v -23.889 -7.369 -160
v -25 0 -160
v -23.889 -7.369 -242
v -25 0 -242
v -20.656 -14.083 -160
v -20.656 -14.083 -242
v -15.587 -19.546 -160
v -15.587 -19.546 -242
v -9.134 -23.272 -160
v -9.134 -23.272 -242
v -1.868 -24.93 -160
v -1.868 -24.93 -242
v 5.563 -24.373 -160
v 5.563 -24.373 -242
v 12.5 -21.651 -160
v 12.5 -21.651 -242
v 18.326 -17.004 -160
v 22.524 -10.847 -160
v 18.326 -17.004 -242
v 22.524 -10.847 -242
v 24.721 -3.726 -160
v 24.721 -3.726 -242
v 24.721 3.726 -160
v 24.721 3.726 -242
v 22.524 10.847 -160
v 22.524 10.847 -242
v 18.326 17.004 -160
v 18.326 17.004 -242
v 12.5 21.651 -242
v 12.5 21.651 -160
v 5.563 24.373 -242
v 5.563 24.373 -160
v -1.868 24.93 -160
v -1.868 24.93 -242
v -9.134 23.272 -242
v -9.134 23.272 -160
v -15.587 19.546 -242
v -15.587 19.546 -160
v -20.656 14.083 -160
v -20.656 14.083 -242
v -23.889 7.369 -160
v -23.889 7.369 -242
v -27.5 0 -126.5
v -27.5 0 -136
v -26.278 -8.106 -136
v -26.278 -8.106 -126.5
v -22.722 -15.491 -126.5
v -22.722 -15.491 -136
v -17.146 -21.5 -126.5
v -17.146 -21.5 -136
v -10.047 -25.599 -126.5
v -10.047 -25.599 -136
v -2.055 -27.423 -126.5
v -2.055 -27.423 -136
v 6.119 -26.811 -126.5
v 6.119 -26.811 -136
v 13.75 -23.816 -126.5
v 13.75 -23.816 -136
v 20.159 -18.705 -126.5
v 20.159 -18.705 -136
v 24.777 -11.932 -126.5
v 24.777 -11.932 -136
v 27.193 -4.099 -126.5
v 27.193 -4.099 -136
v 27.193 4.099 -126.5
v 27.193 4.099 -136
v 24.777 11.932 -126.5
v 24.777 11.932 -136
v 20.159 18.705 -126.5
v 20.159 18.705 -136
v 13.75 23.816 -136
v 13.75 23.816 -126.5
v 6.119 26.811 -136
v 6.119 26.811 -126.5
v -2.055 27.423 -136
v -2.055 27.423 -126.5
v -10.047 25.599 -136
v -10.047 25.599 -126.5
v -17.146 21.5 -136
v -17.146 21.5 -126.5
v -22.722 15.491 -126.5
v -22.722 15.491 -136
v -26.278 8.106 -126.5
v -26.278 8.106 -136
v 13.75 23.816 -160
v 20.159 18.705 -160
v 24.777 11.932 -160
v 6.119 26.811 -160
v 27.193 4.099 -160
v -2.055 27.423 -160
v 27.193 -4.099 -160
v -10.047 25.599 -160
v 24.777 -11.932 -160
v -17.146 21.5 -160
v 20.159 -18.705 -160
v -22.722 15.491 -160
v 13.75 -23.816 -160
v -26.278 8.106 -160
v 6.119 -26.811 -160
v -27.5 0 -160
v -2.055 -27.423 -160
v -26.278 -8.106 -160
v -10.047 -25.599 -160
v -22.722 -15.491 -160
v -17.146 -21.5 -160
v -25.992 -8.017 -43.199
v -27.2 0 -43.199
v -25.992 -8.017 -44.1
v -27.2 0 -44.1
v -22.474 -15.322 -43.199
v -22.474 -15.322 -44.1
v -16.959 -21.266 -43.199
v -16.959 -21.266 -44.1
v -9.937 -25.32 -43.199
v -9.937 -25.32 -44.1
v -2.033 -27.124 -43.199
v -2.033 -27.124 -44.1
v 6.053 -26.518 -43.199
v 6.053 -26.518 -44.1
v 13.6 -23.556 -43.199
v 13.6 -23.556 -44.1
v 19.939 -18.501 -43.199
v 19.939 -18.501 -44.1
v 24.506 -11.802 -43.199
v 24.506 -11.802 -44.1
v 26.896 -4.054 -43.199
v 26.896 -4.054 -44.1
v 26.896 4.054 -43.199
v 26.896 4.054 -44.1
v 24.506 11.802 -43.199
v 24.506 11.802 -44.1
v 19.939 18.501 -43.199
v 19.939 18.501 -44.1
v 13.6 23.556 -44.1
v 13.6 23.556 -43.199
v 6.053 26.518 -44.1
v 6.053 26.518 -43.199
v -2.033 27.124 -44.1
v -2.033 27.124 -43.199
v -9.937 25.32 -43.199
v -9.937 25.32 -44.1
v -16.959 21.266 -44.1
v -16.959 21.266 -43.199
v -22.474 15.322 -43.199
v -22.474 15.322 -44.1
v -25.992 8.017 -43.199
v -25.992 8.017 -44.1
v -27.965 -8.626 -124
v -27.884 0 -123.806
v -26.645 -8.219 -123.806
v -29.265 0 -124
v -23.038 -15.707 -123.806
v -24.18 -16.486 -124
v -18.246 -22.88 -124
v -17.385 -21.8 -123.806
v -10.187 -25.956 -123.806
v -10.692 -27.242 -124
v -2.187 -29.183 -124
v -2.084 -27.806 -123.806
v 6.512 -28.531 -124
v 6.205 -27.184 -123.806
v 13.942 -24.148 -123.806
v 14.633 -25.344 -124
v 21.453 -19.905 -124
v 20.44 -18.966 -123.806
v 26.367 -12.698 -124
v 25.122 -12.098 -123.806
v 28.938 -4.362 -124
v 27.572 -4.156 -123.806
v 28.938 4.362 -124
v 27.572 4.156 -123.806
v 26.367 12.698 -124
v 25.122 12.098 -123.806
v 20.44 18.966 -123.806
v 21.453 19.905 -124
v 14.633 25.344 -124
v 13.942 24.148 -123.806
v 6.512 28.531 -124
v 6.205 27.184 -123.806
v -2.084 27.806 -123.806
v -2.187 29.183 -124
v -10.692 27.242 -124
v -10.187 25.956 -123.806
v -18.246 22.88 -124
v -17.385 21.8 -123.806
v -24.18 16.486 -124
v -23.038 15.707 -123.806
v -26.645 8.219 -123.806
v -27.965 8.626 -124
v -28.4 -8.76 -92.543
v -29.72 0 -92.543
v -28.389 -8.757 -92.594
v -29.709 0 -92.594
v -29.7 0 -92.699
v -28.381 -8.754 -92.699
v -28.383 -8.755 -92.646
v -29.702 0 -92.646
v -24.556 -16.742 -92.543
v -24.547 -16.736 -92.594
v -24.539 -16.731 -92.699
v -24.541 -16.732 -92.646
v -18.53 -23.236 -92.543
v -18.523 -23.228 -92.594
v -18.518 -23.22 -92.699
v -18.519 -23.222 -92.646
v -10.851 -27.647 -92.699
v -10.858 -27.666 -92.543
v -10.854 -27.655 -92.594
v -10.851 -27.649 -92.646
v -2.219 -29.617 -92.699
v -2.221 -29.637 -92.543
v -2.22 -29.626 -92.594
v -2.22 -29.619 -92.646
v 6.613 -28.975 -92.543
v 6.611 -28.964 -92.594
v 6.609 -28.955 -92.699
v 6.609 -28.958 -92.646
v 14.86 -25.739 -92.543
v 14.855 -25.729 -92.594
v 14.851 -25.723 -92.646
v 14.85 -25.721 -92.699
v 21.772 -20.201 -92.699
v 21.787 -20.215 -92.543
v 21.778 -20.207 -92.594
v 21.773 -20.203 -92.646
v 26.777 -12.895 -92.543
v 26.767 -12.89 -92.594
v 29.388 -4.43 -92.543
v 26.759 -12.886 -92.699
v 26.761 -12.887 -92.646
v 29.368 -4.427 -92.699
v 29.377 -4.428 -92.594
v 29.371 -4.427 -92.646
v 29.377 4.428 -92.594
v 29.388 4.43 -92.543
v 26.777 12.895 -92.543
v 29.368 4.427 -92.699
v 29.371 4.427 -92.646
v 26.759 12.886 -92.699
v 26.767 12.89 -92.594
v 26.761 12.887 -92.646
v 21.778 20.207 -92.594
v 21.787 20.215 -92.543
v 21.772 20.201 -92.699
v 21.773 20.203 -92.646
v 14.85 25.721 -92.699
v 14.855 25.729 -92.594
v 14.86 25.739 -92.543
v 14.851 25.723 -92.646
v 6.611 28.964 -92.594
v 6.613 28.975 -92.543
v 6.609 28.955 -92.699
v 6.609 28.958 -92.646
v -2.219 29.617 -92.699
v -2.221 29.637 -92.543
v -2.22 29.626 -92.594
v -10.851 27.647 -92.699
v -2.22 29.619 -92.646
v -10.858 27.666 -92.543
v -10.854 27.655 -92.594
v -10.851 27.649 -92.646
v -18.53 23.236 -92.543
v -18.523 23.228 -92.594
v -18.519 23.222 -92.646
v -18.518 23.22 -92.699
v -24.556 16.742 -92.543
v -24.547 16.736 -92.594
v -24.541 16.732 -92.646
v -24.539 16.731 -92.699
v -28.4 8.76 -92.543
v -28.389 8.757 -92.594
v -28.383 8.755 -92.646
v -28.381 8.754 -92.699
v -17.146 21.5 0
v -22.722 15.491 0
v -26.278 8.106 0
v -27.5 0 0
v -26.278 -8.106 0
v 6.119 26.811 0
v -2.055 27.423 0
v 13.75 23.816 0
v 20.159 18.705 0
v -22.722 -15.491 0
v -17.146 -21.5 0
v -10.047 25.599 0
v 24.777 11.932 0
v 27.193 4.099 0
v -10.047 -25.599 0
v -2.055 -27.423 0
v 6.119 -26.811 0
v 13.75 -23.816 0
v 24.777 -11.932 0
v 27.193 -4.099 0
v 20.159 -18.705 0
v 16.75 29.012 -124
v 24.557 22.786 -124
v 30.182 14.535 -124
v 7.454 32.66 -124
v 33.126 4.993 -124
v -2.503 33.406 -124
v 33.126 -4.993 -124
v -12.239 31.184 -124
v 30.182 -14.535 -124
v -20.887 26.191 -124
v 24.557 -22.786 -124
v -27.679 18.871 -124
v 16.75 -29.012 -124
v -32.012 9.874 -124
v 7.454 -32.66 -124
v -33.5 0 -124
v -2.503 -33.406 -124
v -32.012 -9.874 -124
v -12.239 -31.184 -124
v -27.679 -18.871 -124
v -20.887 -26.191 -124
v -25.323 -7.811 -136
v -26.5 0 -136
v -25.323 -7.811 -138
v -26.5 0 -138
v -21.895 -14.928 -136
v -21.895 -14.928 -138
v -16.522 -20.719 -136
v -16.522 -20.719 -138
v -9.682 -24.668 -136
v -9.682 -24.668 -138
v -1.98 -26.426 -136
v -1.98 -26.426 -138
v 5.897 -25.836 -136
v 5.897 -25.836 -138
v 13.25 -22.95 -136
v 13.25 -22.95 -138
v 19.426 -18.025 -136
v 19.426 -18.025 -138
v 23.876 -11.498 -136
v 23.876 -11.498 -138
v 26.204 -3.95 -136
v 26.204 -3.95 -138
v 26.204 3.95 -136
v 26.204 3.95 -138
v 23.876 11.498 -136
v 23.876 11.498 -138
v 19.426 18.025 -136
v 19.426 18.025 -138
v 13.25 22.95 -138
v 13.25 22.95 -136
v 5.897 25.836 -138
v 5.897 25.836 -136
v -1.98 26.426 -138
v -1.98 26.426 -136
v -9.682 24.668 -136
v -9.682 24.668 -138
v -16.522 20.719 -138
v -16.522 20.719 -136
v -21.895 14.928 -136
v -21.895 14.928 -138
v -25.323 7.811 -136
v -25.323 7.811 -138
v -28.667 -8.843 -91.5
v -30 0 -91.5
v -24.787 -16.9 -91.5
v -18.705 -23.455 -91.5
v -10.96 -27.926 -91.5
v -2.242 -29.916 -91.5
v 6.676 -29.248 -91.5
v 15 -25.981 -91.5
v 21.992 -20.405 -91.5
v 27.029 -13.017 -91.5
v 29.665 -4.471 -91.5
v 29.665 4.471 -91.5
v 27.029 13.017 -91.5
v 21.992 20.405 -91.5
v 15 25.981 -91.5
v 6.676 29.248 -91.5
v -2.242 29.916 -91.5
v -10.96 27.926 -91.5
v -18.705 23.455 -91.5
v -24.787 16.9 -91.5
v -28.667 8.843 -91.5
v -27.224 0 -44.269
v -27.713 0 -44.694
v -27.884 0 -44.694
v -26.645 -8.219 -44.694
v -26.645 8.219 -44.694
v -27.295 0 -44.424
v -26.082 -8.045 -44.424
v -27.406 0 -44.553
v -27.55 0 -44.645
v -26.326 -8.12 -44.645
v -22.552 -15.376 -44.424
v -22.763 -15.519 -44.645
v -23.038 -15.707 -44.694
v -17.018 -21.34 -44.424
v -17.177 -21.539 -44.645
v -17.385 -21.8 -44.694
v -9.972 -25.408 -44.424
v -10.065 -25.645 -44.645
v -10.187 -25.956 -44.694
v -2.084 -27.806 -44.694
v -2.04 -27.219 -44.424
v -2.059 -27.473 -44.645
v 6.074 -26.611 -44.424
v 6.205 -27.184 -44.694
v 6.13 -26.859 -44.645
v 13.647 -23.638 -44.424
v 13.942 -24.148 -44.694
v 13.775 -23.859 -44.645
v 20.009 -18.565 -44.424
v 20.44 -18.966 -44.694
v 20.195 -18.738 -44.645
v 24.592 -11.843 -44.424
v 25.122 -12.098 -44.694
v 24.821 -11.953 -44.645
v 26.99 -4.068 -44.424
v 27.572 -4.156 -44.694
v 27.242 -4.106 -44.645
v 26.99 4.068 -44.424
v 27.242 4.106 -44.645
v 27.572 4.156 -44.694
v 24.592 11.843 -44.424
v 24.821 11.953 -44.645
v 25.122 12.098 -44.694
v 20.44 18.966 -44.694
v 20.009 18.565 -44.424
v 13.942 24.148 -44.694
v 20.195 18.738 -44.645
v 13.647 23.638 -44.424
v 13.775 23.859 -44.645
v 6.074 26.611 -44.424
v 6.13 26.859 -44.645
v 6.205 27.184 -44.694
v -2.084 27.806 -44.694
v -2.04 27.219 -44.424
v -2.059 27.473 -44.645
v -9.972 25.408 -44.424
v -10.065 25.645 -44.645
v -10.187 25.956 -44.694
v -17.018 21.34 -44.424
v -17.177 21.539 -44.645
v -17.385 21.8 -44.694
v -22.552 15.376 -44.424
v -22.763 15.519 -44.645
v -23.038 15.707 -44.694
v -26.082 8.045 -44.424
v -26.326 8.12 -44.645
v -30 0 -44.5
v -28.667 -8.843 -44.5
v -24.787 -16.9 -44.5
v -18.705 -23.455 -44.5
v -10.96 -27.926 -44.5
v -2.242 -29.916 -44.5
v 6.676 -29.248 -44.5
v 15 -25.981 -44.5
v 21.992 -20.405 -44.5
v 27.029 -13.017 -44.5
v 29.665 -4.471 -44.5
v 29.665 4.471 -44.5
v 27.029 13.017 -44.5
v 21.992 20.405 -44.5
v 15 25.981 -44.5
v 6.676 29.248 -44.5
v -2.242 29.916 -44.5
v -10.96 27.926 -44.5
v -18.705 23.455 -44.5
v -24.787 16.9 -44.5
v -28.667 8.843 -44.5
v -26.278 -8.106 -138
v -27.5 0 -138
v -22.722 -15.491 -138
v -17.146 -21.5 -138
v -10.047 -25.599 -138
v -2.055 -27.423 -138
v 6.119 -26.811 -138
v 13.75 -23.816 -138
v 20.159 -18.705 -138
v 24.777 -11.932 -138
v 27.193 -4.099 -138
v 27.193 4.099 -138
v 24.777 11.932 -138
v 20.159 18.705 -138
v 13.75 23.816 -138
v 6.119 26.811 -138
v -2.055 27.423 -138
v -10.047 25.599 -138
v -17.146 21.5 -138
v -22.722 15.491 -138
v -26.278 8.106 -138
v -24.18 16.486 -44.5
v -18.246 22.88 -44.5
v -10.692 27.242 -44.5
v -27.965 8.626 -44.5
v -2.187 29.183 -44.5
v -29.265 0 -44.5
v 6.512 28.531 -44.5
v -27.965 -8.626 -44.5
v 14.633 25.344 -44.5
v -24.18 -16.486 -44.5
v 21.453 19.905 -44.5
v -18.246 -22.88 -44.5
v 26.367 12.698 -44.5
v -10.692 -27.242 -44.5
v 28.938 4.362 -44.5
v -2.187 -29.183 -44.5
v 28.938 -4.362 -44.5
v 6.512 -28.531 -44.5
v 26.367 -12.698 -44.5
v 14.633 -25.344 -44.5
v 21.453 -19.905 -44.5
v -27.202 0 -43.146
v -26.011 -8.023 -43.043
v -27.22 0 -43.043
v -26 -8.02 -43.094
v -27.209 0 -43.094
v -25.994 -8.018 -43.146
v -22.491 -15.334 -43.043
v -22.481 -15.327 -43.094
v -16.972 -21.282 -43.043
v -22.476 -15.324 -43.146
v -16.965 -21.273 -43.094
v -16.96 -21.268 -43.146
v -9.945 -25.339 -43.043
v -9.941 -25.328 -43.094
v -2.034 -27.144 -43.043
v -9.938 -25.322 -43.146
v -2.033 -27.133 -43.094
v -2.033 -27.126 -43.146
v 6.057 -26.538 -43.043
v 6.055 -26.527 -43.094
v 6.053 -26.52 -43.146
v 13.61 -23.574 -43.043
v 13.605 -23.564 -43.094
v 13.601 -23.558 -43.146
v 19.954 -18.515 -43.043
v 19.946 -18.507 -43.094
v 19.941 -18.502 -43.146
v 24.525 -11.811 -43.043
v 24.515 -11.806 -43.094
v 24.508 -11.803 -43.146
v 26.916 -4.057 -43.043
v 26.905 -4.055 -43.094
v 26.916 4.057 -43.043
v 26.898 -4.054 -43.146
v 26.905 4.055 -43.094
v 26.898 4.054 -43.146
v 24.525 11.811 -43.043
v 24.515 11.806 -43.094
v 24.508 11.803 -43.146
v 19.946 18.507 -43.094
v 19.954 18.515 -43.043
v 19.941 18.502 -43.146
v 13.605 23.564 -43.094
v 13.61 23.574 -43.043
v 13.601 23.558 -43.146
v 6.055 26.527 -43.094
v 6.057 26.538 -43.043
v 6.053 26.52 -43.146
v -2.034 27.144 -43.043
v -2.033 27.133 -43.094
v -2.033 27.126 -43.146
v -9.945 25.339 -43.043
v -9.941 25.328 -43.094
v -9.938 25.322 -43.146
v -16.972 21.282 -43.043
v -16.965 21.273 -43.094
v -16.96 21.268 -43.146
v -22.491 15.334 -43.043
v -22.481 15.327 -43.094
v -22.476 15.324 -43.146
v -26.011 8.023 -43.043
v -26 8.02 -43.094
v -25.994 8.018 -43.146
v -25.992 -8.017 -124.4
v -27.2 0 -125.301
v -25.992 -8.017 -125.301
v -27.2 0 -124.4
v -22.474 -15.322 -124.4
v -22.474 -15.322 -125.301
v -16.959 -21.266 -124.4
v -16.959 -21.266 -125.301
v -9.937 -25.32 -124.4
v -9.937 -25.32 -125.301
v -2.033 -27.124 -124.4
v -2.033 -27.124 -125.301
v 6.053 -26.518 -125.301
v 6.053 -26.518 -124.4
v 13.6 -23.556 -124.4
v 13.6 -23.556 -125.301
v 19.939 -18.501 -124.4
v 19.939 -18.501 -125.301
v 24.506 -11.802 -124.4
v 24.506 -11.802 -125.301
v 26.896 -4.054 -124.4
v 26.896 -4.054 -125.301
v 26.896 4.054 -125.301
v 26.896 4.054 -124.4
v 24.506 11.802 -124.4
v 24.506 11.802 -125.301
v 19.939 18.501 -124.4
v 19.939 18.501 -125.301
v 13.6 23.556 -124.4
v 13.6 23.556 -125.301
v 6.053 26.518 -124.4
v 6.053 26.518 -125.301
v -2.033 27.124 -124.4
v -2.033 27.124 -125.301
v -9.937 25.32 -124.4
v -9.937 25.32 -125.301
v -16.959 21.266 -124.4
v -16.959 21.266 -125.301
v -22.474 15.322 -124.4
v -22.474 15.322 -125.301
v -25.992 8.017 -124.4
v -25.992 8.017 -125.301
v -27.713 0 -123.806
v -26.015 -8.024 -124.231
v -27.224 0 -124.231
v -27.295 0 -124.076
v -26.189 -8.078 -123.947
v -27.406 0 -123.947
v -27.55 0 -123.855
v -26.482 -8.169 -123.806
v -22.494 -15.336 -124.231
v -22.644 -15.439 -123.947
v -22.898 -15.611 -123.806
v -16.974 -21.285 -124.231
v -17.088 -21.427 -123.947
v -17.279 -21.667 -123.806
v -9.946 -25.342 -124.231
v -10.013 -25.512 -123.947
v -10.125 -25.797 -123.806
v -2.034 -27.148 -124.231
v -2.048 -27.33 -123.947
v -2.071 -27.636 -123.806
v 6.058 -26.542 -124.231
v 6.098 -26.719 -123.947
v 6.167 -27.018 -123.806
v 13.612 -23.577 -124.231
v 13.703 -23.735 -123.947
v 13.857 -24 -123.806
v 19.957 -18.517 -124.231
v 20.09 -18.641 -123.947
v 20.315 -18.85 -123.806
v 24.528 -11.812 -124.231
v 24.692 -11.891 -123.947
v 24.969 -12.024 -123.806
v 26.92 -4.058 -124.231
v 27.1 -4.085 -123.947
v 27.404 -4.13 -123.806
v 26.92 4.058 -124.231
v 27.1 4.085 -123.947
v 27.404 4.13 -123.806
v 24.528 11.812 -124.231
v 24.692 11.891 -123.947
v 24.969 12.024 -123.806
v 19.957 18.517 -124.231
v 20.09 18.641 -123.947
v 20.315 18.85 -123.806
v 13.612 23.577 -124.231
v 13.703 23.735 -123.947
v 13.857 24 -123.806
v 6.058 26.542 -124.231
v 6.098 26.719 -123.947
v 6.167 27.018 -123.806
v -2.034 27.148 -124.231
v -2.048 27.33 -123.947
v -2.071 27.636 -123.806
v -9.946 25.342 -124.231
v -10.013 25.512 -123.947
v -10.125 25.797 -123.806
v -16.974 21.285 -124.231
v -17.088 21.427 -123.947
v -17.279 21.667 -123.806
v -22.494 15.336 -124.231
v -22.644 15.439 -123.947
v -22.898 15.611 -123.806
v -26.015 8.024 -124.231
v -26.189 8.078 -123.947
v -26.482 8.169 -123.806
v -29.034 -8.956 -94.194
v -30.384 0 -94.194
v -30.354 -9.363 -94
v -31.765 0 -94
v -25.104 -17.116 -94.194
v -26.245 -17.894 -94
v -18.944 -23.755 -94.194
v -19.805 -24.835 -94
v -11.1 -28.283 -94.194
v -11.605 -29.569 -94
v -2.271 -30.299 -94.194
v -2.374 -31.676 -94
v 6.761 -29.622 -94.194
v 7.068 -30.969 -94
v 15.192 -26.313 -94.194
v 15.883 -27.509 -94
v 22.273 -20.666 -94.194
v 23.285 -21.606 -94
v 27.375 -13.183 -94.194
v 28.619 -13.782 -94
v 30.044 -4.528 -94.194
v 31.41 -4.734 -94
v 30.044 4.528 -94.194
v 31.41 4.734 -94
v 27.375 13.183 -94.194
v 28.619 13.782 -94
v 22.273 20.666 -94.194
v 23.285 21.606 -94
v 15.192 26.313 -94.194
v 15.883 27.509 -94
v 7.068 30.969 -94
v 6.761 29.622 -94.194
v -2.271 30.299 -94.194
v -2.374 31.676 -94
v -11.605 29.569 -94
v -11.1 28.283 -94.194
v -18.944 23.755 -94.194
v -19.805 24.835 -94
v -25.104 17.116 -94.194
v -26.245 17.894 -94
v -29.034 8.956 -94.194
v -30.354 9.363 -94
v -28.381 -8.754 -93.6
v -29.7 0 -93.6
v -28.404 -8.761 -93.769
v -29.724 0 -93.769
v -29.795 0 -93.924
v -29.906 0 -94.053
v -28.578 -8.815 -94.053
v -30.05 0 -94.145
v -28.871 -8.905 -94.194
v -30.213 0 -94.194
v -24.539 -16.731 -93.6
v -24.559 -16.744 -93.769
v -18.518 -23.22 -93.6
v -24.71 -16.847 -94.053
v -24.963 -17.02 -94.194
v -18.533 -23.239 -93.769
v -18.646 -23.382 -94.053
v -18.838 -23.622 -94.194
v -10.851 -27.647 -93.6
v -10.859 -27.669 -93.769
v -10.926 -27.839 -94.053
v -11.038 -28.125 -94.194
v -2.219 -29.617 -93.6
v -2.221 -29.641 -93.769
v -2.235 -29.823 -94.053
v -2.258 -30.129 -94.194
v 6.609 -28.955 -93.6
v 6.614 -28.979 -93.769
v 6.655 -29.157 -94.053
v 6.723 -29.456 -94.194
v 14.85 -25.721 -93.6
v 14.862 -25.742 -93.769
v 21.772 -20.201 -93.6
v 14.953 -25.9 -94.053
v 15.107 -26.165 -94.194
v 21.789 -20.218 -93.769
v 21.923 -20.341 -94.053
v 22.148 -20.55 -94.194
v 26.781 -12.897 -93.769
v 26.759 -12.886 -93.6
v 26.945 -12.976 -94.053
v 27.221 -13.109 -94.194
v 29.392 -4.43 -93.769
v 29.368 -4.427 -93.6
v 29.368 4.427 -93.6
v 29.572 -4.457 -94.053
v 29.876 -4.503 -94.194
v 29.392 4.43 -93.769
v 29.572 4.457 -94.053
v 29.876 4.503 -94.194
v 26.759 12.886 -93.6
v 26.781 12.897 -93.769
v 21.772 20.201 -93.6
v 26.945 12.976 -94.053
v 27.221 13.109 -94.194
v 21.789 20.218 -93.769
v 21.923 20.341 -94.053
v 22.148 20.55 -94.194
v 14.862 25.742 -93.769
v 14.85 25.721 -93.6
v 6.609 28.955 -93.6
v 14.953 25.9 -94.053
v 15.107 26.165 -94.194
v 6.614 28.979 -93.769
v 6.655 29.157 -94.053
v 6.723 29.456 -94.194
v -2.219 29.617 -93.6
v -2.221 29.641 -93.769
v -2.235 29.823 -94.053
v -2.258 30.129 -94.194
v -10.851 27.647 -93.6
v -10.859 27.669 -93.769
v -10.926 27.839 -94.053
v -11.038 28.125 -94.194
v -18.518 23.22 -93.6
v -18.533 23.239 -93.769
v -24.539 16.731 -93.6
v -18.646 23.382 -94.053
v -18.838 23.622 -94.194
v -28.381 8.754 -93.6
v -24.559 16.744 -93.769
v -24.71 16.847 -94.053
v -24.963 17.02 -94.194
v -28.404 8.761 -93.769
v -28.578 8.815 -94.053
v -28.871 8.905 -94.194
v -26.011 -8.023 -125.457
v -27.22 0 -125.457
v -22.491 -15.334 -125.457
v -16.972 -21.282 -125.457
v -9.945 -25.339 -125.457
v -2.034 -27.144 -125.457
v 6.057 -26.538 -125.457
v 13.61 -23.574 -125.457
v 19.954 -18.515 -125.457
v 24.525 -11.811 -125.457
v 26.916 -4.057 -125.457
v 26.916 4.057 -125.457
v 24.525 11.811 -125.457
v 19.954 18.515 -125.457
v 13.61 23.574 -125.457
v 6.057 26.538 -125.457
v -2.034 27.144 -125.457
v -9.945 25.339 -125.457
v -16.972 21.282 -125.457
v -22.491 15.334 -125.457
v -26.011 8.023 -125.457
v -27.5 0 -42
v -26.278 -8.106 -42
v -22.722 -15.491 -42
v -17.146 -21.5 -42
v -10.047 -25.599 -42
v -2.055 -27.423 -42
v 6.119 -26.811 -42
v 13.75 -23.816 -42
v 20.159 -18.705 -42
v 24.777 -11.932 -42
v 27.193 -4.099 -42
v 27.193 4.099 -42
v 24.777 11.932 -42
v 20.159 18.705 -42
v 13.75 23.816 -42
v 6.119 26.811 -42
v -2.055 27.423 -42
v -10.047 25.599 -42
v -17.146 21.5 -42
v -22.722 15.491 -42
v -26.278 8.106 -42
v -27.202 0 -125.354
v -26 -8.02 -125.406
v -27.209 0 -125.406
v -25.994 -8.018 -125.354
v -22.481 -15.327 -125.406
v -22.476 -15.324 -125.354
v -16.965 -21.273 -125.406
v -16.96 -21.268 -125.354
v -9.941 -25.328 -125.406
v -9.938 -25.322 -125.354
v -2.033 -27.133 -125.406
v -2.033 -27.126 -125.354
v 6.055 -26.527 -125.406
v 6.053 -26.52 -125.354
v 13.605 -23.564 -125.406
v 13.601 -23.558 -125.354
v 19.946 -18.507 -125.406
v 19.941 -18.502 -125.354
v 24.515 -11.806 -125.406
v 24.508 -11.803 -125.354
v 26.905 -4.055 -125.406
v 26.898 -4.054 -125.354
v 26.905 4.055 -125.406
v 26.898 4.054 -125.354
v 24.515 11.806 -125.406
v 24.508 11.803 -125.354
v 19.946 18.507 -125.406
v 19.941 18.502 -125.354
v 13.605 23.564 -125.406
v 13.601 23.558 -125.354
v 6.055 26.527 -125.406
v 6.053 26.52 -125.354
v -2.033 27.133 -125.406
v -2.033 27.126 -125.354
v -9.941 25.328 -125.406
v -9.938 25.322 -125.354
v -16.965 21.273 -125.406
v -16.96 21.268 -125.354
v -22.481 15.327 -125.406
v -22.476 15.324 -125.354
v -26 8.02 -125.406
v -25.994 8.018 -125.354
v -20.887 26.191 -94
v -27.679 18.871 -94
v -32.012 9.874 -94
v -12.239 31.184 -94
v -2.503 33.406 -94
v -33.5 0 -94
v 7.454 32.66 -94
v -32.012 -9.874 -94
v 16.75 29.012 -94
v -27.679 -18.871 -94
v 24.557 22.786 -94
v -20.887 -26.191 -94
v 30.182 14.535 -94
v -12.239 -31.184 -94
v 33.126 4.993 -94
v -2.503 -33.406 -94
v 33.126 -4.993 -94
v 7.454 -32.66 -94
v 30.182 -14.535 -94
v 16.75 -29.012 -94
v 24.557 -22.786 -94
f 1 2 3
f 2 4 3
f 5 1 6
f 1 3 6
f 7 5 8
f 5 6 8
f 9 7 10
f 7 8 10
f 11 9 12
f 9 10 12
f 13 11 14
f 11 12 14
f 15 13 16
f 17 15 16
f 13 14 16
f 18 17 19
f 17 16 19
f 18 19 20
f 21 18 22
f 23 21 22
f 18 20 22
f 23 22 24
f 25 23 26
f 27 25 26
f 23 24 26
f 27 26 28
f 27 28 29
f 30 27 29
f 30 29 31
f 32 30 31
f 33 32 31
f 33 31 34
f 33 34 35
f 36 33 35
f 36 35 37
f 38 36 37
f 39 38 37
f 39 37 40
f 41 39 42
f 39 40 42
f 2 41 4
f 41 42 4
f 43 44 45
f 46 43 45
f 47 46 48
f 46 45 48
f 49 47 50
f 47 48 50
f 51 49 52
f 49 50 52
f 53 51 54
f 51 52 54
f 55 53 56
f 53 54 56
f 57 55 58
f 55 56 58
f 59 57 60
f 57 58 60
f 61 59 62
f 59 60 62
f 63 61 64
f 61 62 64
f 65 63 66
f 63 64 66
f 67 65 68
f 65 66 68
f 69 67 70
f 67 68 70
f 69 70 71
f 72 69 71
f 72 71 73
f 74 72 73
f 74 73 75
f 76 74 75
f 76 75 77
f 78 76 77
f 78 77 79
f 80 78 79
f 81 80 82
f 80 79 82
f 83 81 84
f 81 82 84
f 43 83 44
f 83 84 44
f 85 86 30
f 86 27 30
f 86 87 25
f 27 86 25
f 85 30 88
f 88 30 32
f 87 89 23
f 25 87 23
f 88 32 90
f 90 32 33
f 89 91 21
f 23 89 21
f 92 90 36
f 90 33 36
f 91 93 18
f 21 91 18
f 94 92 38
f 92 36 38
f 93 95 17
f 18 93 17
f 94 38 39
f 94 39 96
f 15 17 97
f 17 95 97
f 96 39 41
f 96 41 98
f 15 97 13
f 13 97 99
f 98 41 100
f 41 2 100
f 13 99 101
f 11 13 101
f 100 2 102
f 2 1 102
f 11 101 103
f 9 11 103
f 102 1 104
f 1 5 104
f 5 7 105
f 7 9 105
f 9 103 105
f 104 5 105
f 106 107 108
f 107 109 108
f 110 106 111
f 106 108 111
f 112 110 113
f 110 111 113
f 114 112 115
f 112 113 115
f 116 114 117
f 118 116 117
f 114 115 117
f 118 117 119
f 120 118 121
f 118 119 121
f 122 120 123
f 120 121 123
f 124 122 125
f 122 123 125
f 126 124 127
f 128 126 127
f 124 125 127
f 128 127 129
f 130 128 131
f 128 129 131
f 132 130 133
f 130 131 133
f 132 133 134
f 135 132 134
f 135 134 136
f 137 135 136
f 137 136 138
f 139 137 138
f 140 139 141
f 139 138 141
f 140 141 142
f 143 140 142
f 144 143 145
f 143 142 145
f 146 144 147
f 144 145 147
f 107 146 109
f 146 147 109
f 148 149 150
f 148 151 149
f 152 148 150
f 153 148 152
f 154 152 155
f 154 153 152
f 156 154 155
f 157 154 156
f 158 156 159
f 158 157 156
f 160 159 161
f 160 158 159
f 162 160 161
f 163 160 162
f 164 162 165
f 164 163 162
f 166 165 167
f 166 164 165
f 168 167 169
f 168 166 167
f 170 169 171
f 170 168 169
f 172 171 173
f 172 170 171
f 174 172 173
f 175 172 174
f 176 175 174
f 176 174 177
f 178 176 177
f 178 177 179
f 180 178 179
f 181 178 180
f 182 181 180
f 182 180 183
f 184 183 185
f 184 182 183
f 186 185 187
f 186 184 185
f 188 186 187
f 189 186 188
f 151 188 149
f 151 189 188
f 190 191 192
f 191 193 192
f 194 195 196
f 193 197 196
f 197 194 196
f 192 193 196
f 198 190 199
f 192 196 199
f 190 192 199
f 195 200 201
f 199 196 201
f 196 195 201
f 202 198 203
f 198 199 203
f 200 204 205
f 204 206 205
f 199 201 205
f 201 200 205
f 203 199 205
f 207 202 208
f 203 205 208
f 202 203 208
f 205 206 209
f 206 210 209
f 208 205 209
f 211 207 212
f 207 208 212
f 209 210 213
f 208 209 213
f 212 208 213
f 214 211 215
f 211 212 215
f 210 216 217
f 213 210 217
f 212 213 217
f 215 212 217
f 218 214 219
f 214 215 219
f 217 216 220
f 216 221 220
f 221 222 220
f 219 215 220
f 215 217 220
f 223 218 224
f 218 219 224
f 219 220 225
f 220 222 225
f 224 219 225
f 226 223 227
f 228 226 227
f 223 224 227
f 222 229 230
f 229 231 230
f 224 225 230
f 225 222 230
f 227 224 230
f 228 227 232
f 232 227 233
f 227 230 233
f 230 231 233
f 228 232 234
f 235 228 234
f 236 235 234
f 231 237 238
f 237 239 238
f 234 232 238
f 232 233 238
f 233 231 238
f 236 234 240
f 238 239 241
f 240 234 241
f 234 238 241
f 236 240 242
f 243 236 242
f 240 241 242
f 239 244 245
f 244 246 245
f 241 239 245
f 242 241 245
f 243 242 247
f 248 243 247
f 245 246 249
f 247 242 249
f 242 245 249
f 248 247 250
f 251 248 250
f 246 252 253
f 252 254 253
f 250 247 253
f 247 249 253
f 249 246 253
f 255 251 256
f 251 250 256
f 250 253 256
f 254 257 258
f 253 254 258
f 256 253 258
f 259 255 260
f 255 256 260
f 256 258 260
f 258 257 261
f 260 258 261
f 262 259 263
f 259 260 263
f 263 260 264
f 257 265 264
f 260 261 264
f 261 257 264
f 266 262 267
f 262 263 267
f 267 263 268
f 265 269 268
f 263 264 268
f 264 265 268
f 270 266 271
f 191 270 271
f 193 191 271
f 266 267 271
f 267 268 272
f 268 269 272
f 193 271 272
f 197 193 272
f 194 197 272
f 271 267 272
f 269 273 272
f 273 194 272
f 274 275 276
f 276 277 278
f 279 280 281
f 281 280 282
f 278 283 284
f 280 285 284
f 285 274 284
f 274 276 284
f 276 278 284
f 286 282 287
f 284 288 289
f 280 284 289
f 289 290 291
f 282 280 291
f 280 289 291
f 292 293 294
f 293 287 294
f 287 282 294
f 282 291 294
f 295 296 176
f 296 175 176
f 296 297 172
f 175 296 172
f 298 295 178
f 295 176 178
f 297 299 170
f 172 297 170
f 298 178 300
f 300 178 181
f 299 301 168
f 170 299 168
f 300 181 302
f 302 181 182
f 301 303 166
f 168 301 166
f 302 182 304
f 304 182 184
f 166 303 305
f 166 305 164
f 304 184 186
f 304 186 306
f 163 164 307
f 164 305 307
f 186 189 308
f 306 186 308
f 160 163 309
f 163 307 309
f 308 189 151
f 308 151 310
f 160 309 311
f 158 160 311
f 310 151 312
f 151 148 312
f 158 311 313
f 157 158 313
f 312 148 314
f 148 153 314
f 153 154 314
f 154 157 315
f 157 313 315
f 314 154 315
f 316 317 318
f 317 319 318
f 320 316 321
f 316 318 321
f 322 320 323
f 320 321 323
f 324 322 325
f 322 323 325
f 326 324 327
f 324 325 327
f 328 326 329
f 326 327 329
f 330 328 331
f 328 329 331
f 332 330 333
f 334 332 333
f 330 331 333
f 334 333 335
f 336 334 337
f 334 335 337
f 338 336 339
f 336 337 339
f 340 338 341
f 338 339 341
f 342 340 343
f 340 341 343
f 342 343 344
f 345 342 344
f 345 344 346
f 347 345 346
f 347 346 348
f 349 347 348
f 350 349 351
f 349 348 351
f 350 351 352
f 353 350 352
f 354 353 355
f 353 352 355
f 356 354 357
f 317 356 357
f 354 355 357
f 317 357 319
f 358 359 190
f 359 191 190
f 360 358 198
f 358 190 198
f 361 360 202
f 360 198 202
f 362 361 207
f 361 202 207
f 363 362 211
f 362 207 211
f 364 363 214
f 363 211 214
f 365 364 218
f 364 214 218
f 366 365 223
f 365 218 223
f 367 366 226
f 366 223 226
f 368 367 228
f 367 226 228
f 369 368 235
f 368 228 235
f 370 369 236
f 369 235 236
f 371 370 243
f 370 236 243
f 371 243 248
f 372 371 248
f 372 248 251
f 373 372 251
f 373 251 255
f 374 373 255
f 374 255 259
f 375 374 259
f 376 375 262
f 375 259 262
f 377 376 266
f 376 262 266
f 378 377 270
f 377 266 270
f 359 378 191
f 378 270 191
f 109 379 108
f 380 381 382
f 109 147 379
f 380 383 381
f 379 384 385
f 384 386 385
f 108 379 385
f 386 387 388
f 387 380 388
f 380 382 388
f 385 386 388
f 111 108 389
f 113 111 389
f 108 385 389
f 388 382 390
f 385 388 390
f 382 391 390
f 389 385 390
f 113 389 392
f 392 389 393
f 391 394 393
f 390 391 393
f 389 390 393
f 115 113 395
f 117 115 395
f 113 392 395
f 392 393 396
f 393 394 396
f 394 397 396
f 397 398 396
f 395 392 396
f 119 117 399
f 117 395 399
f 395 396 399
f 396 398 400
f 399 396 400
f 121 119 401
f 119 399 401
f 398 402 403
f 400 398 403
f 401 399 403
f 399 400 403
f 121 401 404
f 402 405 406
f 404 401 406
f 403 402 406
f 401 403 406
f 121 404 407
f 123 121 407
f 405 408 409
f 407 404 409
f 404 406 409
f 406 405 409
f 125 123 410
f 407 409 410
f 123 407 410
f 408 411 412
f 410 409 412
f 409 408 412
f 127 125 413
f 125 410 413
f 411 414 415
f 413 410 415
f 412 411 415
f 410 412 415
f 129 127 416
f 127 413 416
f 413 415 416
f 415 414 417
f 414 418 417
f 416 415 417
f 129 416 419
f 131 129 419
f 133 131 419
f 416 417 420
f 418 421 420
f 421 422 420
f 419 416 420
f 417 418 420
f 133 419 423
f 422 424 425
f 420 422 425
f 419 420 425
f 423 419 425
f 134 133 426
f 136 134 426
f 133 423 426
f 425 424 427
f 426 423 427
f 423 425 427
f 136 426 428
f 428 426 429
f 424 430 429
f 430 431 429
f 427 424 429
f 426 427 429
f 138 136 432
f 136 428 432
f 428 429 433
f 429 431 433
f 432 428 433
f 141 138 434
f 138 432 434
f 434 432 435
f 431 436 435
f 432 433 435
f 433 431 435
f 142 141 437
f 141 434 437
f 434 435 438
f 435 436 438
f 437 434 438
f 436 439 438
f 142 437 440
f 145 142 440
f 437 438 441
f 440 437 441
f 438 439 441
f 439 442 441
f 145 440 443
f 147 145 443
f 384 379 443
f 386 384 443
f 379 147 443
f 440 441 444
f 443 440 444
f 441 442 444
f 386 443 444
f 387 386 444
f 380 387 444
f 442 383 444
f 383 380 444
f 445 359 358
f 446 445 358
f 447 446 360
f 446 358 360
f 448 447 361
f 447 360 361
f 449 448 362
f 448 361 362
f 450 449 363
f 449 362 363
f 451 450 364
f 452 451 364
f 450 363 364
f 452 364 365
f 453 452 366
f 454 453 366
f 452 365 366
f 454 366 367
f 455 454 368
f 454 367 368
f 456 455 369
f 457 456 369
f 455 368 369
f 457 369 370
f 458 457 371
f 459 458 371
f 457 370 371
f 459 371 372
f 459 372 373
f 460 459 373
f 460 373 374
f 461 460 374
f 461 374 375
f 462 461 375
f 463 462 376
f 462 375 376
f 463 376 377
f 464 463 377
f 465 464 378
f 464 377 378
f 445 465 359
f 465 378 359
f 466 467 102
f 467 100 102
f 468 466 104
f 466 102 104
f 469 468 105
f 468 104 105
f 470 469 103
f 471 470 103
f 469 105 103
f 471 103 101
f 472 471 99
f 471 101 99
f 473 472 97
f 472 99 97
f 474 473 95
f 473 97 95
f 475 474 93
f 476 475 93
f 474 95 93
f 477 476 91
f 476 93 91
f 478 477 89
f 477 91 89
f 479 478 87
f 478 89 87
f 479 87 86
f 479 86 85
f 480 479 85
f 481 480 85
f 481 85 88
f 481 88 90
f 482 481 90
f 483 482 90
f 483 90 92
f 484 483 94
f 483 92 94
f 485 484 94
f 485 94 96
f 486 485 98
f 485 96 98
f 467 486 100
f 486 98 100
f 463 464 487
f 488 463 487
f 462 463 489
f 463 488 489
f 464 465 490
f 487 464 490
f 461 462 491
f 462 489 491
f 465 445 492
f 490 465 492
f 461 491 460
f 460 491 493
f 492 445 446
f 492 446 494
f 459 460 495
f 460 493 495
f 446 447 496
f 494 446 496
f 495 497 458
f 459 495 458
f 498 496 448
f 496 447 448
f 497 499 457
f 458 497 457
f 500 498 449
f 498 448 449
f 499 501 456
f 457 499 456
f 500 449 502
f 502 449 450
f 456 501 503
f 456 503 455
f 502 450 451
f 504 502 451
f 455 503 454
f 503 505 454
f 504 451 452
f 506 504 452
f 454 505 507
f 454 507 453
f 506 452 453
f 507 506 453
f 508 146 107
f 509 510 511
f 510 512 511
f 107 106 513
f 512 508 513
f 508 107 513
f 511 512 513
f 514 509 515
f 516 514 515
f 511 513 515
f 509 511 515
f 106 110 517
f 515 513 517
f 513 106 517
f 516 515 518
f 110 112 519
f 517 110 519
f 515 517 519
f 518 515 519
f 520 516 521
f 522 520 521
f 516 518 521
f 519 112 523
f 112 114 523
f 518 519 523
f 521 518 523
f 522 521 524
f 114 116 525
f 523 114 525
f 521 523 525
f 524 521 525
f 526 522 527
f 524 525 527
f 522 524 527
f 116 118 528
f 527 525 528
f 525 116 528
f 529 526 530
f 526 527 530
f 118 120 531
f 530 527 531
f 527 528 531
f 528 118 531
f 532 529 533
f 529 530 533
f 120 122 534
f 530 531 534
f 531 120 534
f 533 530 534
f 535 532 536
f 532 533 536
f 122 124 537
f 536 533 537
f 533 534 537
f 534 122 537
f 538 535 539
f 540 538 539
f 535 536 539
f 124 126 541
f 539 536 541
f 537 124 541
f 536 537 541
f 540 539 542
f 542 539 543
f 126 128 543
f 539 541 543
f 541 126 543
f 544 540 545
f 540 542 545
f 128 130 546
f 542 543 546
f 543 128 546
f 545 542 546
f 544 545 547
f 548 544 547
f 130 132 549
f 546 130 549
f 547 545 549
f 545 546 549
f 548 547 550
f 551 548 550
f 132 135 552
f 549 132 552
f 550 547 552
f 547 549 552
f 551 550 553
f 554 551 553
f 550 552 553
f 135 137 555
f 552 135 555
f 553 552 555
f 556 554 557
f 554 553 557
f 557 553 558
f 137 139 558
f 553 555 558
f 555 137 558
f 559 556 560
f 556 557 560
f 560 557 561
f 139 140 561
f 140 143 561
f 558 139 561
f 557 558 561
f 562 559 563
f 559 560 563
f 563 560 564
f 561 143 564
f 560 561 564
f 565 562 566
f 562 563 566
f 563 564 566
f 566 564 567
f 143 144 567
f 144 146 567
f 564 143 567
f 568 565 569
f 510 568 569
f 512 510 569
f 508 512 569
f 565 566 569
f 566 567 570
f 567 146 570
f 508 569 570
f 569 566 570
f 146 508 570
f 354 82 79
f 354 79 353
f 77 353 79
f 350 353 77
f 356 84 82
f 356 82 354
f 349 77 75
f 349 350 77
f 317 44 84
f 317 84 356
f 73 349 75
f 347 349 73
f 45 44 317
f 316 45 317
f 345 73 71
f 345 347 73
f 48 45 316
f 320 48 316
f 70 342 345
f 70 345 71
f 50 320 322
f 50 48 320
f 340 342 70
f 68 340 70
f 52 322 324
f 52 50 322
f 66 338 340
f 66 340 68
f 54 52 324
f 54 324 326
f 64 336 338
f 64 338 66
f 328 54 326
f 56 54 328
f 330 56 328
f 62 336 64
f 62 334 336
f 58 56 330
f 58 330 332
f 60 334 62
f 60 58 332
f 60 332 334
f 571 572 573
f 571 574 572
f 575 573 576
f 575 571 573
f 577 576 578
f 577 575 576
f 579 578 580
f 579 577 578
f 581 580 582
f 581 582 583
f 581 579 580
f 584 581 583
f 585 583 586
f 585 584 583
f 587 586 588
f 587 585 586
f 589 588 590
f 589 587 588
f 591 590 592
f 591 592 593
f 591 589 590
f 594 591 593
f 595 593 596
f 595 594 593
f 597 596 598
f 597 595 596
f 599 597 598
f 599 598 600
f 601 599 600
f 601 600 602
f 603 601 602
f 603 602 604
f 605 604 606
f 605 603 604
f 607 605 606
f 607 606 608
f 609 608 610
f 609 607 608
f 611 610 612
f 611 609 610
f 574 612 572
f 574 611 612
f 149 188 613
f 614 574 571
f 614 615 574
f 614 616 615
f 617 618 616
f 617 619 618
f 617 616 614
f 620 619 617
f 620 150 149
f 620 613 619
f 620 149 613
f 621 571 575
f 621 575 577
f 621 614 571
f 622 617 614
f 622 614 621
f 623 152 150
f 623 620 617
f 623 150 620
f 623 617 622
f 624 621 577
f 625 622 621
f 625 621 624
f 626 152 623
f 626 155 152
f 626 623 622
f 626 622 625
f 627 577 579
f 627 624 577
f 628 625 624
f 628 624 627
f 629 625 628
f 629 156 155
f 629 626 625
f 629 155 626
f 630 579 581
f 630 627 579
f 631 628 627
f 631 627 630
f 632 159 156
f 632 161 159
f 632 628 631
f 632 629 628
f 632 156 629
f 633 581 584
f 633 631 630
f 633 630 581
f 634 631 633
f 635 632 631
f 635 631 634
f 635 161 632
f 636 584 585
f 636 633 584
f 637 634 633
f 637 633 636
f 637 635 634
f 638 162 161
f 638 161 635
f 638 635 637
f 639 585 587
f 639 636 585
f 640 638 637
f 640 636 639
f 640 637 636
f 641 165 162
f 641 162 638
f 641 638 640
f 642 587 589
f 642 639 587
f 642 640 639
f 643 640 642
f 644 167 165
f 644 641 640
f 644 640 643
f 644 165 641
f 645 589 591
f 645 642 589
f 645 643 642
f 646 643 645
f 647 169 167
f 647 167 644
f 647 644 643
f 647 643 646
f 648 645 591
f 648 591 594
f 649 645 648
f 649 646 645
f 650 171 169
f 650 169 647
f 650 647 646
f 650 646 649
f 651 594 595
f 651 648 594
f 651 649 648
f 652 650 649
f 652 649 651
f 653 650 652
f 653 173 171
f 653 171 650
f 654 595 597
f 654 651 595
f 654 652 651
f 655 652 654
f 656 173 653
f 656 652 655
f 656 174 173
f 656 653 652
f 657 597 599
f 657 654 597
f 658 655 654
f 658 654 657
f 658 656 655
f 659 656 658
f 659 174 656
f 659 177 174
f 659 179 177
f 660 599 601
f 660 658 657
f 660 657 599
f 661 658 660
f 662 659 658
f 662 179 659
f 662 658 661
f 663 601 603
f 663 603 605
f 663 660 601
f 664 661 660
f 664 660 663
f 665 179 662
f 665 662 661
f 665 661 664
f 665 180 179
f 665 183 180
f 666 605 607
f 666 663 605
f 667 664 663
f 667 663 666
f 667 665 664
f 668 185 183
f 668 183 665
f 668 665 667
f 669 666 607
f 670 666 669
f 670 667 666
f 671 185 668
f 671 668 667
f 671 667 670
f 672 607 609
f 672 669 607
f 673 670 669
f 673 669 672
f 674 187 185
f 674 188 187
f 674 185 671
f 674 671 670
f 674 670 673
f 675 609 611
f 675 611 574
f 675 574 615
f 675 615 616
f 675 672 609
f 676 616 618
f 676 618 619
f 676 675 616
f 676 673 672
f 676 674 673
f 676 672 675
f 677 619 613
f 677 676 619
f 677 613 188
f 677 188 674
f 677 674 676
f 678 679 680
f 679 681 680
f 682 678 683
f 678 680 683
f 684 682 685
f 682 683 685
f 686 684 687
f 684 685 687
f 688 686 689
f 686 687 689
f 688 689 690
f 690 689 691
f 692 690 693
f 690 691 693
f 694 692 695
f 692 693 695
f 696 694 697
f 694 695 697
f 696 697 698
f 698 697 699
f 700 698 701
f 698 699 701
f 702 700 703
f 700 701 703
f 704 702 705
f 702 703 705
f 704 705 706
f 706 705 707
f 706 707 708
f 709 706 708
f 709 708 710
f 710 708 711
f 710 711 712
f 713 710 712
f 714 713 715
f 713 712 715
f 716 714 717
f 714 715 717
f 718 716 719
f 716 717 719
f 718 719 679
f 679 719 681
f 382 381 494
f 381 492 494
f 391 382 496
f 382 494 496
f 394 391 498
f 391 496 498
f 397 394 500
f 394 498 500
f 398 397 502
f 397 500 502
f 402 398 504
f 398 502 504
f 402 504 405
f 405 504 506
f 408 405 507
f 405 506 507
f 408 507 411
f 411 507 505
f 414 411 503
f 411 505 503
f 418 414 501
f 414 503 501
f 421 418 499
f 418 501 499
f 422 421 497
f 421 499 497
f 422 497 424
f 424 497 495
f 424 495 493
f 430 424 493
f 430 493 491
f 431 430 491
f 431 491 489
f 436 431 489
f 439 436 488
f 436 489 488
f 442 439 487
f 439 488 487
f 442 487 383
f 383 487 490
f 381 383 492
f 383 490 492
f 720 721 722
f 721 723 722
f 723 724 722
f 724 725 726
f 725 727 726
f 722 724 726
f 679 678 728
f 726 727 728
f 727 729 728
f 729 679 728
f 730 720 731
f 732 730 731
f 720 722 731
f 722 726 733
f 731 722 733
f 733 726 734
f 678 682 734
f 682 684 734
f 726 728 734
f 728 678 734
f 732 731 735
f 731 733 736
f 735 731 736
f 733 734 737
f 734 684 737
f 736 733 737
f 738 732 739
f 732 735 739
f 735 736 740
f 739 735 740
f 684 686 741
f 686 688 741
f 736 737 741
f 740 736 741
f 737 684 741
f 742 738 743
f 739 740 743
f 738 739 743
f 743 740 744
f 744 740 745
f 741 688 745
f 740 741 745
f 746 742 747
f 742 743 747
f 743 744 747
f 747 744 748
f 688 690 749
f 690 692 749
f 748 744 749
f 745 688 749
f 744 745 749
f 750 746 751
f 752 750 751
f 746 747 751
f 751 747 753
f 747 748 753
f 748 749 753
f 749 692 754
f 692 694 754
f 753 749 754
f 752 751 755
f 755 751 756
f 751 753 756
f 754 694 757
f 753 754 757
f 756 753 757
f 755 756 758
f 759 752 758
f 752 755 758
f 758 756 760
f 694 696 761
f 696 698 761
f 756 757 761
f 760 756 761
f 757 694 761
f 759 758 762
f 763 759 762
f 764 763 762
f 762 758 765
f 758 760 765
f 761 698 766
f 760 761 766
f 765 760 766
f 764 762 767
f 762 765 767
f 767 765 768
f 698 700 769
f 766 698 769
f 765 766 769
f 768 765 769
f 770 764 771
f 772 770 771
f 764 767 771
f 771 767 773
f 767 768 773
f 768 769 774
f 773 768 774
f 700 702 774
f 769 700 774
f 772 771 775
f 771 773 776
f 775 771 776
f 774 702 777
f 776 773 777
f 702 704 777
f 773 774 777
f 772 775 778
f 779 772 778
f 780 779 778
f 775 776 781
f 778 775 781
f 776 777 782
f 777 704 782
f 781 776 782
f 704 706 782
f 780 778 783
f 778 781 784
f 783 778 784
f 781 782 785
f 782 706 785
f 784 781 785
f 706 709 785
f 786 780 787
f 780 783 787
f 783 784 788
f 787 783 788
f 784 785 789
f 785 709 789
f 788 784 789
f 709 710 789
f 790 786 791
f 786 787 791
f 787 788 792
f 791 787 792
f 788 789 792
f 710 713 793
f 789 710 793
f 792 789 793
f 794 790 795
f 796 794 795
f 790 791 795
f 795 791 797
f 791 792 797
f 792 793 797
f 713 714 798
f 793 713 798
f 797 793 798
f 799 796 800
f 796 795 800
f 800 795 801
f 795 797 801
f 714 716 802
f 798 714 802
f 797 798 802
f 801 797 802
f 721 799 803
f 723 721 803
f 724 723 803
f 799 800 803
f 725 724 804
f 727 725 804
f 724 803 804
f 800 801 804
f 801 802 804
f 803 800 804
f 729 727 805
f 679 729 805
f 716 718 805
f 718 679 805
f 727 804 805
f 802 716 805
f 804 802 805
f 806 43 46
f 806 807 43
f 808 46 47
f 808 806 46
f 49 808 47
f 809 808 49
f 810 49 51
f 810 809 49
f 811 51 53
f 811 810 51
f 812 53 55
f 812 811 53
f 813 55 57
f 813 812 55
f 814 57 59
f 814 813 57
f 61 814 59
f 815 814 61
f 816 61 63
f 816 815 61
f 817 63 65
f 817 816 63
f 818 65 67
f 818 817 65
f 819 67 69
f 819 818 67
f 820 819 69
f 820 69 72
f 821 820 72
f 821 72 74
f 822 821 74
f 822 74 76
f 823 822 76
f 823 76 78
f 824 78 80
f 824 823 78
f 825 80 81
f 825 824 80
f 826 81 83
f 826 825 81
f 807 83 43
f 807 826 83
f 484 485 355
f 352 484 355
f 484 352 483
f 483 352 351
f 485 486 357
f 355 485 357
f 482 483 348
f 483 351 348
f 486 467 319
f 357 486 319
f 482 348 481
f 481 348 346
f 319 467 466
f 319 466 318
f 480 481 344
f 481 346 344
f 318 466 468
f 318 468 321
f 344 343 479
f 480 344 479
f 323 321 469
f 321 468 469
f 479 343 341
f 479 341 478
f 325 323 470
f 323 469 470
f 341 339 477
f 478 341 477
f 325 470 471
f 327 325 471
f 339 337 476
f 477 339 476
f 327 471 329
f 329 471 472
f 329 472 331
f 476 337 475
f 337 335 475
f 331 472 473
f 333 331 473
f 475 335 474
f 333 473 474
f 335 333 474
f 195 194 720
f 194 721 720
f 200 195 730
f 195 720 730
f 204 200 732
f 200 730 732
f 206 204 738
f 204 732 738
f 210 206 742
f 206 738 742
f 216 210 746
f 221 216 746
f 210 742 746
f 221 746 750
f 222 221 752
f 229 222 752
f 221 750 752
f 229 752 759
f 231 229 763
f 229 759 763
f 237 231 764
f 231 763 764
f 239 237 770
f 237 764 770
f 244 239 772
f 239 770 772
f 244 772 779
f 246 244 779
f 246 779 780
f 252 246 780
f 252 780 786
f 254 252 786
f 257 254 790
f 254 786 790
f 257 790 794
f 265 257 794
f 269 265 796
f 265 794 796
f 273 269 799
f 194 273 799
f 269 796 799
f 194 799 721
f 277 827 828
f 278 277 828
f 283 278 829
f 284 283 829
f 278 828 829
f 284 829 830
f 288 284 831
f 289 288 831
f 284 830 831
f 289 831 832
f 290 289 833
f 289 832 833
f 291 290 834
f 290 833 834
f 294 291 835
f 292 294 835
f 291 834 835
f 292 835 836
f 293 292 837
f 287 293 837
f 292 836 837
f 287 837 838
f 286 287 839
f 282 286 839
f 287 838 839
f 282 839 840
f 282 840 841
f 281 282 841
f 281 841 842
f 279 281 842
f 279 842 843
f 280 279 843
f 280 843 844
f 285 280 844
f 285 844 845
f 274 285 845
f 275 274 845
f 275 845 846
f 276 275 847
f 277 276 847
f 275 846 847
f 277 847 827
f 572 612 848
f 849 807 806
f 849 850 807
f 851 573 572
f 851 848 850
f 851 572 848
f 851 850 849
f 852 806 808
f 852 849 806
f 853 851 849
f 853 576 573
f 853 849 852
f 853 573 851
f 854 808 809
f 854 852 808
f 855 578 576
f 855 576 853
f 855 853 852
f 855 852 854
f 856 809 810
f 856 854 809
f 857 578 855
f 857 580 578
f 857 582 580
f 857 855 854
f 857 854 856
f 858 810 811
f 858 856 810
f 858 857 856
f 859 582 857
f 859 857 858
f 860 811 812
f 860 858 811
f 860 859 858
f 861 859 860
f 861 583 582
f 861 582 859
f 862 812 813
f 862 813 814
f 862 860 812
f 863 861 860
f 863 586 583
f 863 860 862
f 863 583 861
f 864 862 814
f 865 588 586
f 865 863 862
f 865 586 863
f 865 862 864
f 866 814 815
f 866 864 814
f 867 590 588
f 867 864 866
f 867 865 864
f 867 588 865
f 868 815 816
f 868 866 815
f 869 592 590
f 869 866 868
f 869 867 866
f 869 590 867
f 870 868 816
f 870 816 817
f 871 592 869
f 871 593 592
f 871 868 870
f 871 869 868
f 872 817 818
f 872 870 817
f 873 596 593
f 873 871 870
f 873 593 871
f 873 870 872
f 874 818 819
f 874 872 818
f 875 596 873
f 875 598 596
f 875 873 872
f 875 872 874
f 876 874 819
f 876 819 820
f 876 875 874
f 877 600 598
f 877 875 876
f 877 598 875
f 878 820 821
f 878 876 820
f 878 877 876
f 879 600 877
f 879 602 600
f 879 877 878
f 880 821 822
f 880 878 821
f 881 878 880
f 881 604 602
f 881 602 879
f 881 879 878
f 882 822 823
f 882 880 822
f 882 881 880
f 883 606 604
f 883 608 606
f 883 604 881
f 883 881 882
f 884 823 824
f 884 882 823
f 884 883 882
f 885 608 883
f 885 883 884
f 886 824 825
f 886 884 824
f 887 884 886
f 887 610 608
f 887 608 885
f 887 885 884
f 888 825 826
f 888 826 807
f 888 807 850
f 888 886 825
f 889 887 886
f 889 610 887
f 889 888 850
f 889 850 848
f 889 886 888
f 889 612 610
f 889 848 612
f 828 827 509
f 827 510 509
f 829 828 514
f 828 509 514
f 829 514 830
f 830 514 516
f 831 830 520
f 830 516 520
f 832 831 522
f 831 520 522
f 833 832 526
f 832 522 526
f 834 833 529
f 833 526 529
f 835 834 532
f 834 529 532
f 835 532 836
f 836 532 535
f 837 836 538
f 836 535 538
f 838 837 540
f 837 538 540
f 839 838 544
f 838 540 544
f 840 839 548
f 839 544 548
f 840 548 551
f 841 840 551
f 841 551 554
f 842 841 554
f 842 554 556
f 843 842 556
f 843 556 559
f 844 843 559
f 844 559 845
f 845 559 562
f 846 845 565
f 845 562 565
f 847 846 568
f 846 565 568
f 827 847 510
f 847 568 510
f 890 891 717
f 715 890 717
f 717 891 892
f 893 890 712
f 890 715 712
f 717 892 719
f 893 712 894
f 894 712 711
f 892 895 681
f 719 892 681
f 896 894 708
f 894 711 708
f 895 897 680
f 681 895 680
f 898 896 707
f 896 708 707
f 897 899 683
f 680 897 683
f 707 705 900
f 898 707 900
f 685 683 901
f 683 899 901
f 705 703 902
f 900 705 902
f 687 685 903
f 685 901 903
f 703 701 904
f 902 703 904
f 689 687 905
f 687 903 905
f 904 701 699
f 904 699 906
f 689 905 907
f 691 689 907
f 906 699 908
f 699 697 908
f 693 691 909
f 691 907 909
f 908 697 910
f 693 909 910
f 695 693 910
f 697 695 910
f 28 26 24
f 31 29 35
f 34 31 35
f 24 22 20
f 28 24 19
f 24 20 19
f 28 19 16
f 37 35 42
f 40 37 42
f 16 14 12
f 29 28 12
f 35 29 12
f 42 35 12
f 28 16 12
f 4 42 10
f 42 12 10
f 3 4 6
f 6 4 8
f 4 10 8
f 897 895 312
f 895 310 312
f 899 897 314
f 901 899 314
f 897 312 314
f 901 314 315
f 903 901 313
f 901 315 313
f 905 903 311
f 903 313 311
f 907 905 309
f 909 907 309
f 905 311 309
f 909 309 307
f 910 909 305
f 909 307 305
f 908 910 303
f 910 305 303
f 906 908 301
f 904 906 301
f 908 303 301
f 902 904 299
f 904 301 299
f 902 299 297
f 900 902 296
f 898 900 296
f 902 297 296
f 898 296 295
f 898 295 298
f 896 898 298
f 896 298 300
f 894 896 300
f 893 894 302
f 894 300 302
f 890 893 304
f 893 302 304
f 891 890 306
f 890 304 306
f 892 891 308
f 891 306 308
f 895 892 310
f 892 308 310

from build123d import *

# Parameters (mm, degrees)
NUT_W = 2
NUT_H = 1


with BuildPart() as part:
    # Au_enkontur → Rotation_GK (revolve)
    with BuildSketch(Plane(origin=(0, 0, 0), x_dir=(0, 0, -1), z_dir=(1, 0, 0)), mode=Mode.PRIVATE) as rotation_gk_sk:
        Polygon((0, 0), (0, 27.5), (44.5, 27.5), (44.5, 30), (94, 30), (94, 33.5), (124, 33.5), (124, 27.5), (160, 27.5), (160, 25), (242, 25), (242, 0), align=None)
    revolve(rotation_gk_sk.sketch.rotate(Axis((0, 0, -88.99), (0, 0, 1)), 90), axis=Axis((0, 0, -88.99), (0, 0, 1)))  # turned: the seam where the file's is

    # Freistich 1 → Schnitt-Rotation_Freistich 1 (revolve, cut)
    with BuildSketch(Plane(origin=(0, 0, 0), x_dir=(0, 0, -1), z_dir=(1, 0, 0)), mode=Mode.PRIVATE) as schnitt_rotation_freistich_1_sk:
        with BuildLine():
            Line((42, 27.5), (43.043315314, 27.220444504))
            ThreePointArc((43.043315314, 27.220444504), (43.120291025, 27.205133083), (43.198606741, 27.2))
            Line((43.198606741, 27.2), (44.1, 27.2))
            ThreePointArc((44.1, 27.2), (44.552825748, 27.406364583), (44.694160841, 27.883503861))
            Line((44.694160841, 27.883503861), (44.5, 29.265030032))
            Line((44.5, 29.265030032), (42, 29.265030032))
            Line((42, 29.265030032), (42, 27.5))
        make_face()
    revolve(schnitt_rotation_freistich_1_sk.sketch.rotate(Axis((0, 0, -88.99), (0, 0, 1)), 90), axis=Axis((0, 0, -88.99), (0, 0, 1)), mode=Mode.SUBTRACT)  # turned: the seam where the file's is

    # Freistich 2 → Schnitt-Rotation_Freistich 2 (revolve, cut)
    with BuildSketch(Plane(origin=(0, 2.5, -49.5), x_dir=(0, 0, -1), z_dir=(1, 0, 0)), mode=Mode.PRIVATE) as schnitt_rotation_freistich_2_sk:
        with BuildLine():
            Line((42, 27.5), (43.043315314, 27.220444504))
            ThreePointArc((43.043315314, 27.220444504), (43.120291025, 27.205133083), (43.198606741, 27.2))
            Line((43.198606741, 27.2), (44.1, 27.2))
            ThreePointArc((44.1, 27.2), (44.552825748, 27.406364583), (44.694160841, 27.883503861))
            Line((44.694160841, 27.883503861), (44.5, 29.265030032))
            Line((44.5, 29.265030032), (42, 29.265030032))
            Line((42, 29.265030032), (42, 27.5))
        make_face()
    revolve(schnitt_rotation_freistich_2_sk.sketch.rotate(Axis((0, 0, -88.99), (0, 0, 1)), 90), axis=Axis((0, 0, -88.99), (0, 0, 1)), mode=Mode.SUBTRACT)  # turned: the seam where the file's is

    # Freistich 3 → Schnitt-Rotation_Freistich 3 (revolve, cut)
    with BuildSketch(Plane(origin=(0, 0, -168.5), x_dir=(0, 0, 1), z_dir=(-1, 0, 0)), mode=Mode.PRIVATE) as schnitt_rotation_freistich_3_sk:
        with BuildLine():
            Line((42, 27.5), (43.043315314, 27.220444504))
            ThreePointArc((43.043315314, 27.220444504), (43.120291025, 27.205133083), (43.198606741, 27.2))
            Line((43.198606741, 27.2), (44.1, 27.2))
            ThreePointArc((44.1, 27.2), (44.552825748, 27.406364583), (44.694160841, 27.883503861))
            Line((44.694160841, 27.883503861), (44.5, 29.265030032))
            Line((44.5, 29.265030032), (42, 29.265030032))
            Line((42, 29.265030032), (42, 27.5))
        make_face()
    revolve(schnitt_rotation_freistich_3_sk.sketch.rotate(Axis((0, 0, -88.99), (0, 0, 1)), 90), axis=Axis((0, 0, -88.99), (0, 0, 1)), mode=Mode.SUBTRACT)  # turned: the seam where the file's is

    # Nut → Schnitt-Rotation_Nut (revolve, cut)
    with BuildSketch(Plane(origin=(0, 0, 0), x_dir=(0, 0, -1), z_dir=(1, 0, 0)), mode=Mode.PRIVATE) as schnitt_rotation_nut_sk:
        with Locations((137, 27)):
            Rectangle(NUT_W, NUT_H)
    revolve(schnitt_rotation_nut_sk.sketch.rotate(Axis((0, 0, -88.99), (0, 0, 1)), 90), axis=Axis((0, 0, -88.99), (0, 0, 1)), mode=Mode.SUBTRACT)  # turned: the seam where the file's is


solid = part.part
